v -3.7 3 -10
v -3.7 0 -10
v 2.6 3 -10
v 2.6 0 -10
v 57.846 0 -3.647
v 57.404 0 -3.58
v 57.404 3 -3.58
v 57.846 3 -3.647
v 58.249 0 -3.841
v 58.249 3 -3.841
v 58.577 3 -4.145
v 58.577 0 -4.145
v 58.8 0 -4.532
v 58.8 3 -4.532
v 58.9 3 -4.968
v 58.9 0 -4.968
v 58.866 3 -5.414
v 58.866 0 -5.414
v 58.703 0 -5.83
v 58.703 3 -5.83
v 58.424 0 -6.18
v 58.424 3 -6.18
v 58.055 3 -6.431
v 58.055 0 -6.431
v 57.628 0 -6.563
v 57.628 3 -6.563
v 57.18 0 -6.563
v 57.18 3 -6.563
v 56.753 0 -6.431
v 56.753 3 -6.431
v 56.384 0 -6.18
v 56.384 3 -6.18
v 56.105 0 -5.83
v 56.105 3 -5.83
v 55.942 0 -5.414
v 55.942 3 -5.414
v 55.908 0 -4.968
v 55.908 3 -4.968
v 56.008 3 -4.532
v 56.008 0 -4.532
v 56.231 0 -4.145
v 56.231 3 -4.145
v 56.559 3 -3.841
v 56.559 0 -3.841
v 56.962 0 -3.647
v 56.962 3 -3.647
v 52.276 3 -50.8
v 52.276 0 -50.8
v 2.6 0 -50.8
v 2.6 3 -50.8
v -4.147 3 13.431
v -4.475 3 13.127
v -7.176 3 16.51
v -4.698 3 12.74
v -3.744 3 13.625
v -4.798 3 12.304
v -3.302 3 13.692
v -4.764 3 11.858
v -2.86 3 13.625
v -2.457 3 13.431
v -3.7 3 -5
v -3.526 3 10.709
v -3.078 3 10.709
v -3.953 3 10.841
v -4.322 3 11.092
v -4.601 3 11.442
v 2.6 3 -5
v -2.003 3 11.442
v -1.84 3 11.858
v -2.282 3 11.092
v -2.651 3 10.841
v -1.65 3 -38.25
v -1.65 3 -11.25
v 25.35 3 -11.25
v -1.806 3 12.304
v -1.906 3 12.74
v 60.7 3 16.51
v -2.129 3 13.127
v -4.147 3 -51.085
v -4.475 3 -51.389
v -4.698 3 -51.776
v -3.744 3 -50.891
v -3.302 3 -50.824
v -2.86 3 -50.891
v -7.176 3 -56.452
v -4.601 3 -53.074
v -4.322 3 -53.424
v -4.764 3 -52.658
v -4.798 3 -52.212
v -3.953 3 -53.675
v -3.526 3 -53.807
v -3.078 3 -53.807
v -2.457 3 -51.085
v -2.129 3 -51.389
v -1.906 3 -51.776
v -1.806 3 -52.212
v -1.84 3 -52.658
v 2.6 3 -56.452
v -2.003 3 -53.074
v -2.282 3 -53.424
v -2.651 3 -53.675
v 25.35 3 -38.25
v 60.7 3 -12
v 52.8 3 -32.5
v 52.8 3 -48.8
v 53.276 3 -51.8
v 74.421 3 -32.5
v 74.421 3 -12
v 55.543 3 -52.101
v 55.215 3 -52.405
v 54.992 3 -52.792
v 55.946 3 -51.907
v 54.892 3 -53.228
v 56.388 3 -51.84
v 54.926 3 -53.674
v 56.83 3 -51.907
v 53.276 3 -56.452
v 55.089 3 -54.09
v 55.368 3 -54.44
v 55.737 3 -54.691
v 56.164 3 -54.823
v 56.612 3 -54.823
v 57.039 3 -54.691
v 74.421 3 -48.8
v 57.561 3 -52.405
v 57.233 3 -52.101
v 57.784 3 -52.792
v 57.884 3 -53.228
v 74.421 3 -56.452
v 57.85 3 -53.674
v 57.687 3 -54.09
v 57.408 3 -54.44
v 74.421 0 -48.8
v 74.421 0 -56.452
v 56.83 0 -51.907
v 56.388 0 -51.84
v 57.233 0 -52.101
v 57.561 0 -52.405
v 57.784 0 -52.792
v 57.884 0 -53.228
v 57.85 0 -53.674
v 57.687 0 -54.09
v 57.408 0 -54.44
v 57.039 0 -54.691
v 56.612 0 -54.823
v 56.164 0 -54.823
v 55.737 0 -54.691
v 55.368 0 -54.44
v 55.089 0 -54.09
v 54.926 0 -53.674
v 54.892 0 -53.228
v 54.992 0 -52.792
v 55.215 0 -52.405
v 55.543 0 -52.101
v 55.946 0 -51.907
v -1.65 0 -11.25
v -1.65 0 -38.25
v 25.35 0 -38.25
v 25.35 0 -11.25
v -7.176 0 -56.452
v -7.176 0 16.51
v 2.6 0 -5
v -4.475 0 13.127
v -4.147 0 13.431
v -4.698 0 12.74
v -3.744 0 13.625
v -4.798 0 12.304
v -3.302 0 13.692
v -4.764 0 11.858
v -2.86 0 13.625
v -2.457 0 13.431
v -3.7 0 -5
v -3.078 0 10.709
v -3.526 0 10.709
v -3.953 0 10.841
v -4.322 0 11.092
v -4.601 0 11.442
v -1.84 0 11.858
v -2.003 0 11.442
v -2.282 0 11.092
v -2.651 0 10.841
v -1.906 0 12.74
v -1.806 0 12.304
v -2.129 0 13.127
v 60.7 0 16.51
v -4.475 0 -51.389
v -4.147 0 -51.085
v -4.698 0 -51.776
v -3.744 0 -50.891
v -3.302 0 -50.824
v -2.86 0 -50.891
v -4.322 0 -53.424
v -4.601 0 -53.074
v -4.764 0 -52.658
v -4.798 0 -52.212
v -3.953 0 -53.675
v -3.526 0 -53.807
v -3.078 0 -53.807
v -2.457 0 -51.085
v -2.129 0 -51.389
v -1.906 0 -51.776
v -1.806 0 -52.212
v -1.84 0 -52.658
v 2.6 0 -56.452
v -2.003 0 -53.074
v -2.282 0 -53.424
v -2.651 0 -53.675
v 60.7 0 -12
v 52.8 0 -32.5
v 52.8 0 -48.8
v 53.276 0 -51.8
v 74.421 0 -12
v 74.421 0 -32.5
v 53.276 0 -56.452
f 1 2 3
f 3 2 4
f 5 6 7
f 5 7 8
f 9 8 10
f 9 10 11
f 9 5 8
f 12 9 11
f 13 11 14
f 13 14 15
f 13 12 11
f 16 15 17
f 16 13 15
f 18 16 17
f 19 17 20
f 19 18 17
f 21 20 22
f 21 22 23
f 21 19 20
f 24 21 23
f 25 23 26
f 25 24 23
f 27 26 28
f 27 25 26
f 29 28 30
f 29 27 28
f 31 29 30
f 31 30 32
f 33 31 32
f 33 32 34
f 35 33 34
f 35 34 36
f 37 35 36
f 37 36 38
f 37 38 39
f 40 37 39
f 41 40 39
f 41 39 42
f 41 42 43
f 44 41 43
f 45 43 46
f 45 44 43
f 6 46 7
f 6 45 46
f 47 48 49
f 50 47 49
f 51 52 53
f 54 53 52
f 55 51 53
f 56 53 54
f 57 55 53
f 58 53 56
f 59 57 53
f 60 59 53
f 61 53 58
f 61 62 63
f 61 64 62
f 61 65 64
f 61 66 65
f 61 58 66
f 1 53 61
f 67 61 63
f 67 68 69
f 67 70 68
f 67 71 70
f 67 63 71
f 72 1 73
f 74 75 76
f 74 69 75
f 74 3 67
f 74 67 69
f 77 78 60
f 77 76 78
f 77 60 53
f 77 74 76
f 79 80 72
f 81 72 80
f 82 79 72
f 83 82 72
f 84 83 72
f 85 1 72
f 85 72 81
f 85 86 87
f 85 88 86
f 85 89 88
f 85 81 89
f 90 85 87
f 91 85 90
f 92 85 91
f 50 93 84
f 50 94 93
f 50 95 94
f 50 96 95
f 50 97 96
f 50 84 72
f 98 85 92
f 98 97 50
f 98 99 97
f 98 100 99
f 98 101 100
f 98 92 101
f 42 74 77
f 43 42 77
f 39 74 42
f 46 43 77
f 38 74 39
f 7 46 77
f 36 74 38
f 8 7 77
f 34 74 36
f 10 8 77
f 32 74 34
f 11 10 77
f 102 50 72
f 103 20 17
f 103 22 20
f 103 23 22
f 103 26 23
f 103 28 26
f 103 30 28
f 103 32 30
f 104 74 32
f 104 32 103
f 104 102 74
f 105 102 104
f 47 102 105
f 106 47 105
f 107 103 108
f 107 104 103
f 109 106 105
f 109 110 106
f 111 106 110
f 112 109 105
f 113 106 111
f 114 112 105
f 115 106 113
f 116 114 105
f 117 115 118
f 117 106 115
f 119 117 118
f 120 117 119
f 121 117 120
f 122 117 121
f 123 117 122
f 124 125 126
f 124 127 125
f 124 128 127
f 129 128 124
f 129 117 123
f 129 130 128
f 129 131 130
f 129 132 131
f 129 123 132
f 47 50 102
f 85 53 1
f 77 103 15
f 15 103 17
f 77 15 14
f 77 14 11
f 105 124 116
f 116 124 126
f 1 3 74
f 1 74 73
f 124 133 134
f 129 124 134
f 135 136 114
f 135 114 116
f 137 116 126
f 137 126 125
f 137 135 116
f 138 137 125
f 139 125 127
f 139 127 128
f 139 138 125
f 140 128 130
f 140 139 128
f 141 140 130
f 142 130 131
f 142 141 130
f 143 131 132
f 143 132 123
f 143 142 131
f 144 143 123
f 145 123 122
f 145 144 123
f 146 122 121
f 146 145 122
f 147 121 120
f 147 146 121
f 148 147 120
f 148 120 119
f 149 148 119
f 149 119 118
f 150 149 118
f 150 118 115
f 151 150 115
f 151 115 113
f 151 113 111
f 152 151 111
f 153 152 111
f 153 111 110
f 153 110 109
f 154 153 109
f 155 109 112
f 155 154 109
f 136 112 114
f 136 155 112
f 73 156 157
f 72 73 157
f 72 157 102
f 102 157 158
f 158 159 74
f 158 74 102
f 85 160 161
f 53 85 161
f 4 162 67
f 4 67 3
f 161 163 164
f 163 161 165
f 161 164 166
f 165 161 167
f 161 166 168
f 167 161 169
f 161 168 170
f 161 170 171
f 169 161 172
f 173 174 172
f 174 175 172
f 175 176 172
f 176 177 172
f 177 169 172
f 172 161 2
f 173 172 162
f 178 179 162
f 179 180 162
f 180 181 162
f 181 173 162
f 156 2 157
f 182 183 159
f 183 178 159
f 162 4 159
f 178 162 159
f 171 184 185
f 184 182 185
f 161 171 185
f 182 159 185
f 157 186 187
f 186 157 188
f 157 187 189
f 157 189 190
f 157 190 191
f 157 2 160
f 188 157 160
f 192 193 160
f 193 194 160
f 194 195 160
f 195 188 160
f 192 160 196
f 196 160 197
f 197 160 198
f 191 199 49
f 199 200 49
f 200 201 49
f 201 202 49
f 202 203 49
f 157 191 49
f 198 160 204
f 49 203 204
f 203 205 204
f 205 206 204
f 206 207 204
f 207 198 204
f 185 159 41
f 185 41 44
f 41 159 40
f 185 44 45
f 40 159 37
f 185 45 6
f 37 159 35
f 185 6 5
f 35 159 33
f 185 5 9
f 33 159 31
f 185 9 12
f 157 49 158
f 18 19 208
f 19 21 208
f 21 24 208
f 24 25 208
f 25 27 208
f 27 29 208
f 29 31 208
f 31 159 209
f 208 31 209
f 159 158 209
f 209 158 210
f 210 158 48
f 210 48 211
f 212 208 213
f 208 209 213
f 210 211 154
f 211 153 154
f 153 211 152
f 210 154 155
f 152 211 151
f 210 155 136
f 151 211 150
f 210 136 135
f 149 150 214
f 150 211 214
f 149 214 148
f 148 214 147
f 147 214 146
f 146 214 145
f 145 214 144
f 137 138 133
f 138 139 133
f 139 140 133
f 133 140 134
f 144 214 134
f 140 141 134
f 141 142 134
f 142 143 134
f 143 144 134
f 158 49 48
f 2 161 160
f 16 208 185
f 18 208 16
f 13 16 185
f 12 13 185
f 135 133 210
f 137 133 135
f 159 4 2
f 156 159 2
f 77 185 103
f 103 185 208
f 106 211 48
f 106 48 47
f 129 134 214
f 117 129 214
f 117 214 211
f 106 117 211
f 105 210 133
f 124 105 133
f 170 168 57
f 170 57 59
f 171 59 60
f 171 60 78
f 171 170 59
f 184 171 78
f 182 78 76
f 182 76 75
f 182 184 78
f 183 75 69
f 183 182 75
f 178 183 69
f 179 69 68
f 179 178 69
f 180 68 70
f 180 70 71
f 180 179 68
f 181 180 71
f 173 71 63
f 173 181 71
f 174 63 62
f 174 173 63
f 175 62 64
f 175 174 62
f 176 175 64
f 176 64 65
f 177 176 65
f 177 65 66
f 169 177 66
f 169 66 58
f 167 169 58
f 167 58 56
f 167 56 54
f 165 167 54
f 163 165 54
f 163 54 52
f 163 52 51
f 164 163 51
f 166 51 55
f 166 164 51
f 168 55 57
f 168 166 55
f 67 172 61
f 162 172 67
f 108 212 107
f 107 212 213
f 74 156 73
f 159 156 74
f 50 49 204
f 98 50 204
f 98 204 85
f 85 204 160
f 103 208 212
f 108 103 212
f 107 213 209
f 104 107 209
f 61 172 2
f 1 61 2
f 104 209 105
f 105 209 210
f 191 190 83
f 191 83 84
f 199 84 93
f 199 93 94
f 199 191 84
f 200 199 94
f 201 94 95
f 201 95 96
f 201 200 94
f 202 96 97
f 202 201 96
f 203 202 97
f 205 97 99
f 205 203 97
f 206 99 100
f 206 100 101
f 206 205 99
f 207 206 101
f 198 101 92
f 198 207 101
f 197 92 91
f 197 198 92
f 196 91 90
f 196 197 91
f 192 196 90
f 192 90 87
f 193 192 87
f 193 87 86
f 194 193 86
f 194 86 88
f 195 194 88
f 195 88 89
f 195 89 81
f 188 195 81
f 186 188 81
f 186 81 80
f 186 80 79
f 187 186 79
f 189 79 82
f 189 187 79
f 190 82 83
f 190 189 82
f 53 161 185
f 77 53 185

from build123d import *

# Parameters (mm, degrees)
SKETCH_1_R      = 1.5
SKETCH_1_W      = 6.3
SKETCH_1_H      = 5
SKETCH_1_W_2    = 27
SKETCH_1_H_2    = 27
EXTRUDE_1_DEPTH = 3
CHAMFER_1_SIZE  = 1


with BuildPart() as part:
    # 草图1 → 凸台-拉伸1 (new body)
    with BuildSketch(Plane(origin=(0, 0, 0), x_dir=(1, 0, 0), z_dir=(0, 1, 0))):
        Polygon((-7.176, 56.452), (-7.176, -16.51), (60.7, -16.51), (60.7, 12), (74.421, 12), (74.421, 32.5), (52.8, 32.5), (52.8, 48.8), (74.421, 48.8), (74.421, 56.452), (53.276, 56.452), (53.276, 50.8), (2.6, 50.8), (2.6, 56.452), align=None)
        with Locations(Location((-3.302, -12.192, 0), (0, 0, 270))):
            Circle(SKETCH_1_R, mode=Mode.SUBTRACT)
        with Locations((-0.55, 7.5)):
            Rectangle(SKETCH_1_W, SKETCH_1_H, mode=Mode.SUBTRACT)
        with Locations(Location((57.404, 5.08, 0), (0, 0, 270))):
            Circle(SKETCH_1_R, mode=Mode.SUBTRACT)
        with Locations((11.85, 24.75)):
            Rectangle(SKETCH_1_W_2, SKETCH_1_H_2, mode=Mode.SUBTRACT)
        with Locations(Location((-3.302, 52.324, 0), (0, 0, 270))):
            Circle(SKETCH_1_R, mode=Mode.SUBTRACT)
        with Locations(Location((56.388, 53.34, 0), (0, 0, 270))):
            Circle(SKETCH_1_R, mode=Mode.SUBTRACT)
    extrude(amount=EXTRUDE_1_DEPTH)

    # 倒角1
    chamfer_1_edges = [part.edges().sort_by_distance(p)[0] for p in [
        (53.276, 1.5, -50.8),
    ]]
    chamfer(chamfer_1_edges, length=CHAMFER_1_SIZE)


solid = part.part
